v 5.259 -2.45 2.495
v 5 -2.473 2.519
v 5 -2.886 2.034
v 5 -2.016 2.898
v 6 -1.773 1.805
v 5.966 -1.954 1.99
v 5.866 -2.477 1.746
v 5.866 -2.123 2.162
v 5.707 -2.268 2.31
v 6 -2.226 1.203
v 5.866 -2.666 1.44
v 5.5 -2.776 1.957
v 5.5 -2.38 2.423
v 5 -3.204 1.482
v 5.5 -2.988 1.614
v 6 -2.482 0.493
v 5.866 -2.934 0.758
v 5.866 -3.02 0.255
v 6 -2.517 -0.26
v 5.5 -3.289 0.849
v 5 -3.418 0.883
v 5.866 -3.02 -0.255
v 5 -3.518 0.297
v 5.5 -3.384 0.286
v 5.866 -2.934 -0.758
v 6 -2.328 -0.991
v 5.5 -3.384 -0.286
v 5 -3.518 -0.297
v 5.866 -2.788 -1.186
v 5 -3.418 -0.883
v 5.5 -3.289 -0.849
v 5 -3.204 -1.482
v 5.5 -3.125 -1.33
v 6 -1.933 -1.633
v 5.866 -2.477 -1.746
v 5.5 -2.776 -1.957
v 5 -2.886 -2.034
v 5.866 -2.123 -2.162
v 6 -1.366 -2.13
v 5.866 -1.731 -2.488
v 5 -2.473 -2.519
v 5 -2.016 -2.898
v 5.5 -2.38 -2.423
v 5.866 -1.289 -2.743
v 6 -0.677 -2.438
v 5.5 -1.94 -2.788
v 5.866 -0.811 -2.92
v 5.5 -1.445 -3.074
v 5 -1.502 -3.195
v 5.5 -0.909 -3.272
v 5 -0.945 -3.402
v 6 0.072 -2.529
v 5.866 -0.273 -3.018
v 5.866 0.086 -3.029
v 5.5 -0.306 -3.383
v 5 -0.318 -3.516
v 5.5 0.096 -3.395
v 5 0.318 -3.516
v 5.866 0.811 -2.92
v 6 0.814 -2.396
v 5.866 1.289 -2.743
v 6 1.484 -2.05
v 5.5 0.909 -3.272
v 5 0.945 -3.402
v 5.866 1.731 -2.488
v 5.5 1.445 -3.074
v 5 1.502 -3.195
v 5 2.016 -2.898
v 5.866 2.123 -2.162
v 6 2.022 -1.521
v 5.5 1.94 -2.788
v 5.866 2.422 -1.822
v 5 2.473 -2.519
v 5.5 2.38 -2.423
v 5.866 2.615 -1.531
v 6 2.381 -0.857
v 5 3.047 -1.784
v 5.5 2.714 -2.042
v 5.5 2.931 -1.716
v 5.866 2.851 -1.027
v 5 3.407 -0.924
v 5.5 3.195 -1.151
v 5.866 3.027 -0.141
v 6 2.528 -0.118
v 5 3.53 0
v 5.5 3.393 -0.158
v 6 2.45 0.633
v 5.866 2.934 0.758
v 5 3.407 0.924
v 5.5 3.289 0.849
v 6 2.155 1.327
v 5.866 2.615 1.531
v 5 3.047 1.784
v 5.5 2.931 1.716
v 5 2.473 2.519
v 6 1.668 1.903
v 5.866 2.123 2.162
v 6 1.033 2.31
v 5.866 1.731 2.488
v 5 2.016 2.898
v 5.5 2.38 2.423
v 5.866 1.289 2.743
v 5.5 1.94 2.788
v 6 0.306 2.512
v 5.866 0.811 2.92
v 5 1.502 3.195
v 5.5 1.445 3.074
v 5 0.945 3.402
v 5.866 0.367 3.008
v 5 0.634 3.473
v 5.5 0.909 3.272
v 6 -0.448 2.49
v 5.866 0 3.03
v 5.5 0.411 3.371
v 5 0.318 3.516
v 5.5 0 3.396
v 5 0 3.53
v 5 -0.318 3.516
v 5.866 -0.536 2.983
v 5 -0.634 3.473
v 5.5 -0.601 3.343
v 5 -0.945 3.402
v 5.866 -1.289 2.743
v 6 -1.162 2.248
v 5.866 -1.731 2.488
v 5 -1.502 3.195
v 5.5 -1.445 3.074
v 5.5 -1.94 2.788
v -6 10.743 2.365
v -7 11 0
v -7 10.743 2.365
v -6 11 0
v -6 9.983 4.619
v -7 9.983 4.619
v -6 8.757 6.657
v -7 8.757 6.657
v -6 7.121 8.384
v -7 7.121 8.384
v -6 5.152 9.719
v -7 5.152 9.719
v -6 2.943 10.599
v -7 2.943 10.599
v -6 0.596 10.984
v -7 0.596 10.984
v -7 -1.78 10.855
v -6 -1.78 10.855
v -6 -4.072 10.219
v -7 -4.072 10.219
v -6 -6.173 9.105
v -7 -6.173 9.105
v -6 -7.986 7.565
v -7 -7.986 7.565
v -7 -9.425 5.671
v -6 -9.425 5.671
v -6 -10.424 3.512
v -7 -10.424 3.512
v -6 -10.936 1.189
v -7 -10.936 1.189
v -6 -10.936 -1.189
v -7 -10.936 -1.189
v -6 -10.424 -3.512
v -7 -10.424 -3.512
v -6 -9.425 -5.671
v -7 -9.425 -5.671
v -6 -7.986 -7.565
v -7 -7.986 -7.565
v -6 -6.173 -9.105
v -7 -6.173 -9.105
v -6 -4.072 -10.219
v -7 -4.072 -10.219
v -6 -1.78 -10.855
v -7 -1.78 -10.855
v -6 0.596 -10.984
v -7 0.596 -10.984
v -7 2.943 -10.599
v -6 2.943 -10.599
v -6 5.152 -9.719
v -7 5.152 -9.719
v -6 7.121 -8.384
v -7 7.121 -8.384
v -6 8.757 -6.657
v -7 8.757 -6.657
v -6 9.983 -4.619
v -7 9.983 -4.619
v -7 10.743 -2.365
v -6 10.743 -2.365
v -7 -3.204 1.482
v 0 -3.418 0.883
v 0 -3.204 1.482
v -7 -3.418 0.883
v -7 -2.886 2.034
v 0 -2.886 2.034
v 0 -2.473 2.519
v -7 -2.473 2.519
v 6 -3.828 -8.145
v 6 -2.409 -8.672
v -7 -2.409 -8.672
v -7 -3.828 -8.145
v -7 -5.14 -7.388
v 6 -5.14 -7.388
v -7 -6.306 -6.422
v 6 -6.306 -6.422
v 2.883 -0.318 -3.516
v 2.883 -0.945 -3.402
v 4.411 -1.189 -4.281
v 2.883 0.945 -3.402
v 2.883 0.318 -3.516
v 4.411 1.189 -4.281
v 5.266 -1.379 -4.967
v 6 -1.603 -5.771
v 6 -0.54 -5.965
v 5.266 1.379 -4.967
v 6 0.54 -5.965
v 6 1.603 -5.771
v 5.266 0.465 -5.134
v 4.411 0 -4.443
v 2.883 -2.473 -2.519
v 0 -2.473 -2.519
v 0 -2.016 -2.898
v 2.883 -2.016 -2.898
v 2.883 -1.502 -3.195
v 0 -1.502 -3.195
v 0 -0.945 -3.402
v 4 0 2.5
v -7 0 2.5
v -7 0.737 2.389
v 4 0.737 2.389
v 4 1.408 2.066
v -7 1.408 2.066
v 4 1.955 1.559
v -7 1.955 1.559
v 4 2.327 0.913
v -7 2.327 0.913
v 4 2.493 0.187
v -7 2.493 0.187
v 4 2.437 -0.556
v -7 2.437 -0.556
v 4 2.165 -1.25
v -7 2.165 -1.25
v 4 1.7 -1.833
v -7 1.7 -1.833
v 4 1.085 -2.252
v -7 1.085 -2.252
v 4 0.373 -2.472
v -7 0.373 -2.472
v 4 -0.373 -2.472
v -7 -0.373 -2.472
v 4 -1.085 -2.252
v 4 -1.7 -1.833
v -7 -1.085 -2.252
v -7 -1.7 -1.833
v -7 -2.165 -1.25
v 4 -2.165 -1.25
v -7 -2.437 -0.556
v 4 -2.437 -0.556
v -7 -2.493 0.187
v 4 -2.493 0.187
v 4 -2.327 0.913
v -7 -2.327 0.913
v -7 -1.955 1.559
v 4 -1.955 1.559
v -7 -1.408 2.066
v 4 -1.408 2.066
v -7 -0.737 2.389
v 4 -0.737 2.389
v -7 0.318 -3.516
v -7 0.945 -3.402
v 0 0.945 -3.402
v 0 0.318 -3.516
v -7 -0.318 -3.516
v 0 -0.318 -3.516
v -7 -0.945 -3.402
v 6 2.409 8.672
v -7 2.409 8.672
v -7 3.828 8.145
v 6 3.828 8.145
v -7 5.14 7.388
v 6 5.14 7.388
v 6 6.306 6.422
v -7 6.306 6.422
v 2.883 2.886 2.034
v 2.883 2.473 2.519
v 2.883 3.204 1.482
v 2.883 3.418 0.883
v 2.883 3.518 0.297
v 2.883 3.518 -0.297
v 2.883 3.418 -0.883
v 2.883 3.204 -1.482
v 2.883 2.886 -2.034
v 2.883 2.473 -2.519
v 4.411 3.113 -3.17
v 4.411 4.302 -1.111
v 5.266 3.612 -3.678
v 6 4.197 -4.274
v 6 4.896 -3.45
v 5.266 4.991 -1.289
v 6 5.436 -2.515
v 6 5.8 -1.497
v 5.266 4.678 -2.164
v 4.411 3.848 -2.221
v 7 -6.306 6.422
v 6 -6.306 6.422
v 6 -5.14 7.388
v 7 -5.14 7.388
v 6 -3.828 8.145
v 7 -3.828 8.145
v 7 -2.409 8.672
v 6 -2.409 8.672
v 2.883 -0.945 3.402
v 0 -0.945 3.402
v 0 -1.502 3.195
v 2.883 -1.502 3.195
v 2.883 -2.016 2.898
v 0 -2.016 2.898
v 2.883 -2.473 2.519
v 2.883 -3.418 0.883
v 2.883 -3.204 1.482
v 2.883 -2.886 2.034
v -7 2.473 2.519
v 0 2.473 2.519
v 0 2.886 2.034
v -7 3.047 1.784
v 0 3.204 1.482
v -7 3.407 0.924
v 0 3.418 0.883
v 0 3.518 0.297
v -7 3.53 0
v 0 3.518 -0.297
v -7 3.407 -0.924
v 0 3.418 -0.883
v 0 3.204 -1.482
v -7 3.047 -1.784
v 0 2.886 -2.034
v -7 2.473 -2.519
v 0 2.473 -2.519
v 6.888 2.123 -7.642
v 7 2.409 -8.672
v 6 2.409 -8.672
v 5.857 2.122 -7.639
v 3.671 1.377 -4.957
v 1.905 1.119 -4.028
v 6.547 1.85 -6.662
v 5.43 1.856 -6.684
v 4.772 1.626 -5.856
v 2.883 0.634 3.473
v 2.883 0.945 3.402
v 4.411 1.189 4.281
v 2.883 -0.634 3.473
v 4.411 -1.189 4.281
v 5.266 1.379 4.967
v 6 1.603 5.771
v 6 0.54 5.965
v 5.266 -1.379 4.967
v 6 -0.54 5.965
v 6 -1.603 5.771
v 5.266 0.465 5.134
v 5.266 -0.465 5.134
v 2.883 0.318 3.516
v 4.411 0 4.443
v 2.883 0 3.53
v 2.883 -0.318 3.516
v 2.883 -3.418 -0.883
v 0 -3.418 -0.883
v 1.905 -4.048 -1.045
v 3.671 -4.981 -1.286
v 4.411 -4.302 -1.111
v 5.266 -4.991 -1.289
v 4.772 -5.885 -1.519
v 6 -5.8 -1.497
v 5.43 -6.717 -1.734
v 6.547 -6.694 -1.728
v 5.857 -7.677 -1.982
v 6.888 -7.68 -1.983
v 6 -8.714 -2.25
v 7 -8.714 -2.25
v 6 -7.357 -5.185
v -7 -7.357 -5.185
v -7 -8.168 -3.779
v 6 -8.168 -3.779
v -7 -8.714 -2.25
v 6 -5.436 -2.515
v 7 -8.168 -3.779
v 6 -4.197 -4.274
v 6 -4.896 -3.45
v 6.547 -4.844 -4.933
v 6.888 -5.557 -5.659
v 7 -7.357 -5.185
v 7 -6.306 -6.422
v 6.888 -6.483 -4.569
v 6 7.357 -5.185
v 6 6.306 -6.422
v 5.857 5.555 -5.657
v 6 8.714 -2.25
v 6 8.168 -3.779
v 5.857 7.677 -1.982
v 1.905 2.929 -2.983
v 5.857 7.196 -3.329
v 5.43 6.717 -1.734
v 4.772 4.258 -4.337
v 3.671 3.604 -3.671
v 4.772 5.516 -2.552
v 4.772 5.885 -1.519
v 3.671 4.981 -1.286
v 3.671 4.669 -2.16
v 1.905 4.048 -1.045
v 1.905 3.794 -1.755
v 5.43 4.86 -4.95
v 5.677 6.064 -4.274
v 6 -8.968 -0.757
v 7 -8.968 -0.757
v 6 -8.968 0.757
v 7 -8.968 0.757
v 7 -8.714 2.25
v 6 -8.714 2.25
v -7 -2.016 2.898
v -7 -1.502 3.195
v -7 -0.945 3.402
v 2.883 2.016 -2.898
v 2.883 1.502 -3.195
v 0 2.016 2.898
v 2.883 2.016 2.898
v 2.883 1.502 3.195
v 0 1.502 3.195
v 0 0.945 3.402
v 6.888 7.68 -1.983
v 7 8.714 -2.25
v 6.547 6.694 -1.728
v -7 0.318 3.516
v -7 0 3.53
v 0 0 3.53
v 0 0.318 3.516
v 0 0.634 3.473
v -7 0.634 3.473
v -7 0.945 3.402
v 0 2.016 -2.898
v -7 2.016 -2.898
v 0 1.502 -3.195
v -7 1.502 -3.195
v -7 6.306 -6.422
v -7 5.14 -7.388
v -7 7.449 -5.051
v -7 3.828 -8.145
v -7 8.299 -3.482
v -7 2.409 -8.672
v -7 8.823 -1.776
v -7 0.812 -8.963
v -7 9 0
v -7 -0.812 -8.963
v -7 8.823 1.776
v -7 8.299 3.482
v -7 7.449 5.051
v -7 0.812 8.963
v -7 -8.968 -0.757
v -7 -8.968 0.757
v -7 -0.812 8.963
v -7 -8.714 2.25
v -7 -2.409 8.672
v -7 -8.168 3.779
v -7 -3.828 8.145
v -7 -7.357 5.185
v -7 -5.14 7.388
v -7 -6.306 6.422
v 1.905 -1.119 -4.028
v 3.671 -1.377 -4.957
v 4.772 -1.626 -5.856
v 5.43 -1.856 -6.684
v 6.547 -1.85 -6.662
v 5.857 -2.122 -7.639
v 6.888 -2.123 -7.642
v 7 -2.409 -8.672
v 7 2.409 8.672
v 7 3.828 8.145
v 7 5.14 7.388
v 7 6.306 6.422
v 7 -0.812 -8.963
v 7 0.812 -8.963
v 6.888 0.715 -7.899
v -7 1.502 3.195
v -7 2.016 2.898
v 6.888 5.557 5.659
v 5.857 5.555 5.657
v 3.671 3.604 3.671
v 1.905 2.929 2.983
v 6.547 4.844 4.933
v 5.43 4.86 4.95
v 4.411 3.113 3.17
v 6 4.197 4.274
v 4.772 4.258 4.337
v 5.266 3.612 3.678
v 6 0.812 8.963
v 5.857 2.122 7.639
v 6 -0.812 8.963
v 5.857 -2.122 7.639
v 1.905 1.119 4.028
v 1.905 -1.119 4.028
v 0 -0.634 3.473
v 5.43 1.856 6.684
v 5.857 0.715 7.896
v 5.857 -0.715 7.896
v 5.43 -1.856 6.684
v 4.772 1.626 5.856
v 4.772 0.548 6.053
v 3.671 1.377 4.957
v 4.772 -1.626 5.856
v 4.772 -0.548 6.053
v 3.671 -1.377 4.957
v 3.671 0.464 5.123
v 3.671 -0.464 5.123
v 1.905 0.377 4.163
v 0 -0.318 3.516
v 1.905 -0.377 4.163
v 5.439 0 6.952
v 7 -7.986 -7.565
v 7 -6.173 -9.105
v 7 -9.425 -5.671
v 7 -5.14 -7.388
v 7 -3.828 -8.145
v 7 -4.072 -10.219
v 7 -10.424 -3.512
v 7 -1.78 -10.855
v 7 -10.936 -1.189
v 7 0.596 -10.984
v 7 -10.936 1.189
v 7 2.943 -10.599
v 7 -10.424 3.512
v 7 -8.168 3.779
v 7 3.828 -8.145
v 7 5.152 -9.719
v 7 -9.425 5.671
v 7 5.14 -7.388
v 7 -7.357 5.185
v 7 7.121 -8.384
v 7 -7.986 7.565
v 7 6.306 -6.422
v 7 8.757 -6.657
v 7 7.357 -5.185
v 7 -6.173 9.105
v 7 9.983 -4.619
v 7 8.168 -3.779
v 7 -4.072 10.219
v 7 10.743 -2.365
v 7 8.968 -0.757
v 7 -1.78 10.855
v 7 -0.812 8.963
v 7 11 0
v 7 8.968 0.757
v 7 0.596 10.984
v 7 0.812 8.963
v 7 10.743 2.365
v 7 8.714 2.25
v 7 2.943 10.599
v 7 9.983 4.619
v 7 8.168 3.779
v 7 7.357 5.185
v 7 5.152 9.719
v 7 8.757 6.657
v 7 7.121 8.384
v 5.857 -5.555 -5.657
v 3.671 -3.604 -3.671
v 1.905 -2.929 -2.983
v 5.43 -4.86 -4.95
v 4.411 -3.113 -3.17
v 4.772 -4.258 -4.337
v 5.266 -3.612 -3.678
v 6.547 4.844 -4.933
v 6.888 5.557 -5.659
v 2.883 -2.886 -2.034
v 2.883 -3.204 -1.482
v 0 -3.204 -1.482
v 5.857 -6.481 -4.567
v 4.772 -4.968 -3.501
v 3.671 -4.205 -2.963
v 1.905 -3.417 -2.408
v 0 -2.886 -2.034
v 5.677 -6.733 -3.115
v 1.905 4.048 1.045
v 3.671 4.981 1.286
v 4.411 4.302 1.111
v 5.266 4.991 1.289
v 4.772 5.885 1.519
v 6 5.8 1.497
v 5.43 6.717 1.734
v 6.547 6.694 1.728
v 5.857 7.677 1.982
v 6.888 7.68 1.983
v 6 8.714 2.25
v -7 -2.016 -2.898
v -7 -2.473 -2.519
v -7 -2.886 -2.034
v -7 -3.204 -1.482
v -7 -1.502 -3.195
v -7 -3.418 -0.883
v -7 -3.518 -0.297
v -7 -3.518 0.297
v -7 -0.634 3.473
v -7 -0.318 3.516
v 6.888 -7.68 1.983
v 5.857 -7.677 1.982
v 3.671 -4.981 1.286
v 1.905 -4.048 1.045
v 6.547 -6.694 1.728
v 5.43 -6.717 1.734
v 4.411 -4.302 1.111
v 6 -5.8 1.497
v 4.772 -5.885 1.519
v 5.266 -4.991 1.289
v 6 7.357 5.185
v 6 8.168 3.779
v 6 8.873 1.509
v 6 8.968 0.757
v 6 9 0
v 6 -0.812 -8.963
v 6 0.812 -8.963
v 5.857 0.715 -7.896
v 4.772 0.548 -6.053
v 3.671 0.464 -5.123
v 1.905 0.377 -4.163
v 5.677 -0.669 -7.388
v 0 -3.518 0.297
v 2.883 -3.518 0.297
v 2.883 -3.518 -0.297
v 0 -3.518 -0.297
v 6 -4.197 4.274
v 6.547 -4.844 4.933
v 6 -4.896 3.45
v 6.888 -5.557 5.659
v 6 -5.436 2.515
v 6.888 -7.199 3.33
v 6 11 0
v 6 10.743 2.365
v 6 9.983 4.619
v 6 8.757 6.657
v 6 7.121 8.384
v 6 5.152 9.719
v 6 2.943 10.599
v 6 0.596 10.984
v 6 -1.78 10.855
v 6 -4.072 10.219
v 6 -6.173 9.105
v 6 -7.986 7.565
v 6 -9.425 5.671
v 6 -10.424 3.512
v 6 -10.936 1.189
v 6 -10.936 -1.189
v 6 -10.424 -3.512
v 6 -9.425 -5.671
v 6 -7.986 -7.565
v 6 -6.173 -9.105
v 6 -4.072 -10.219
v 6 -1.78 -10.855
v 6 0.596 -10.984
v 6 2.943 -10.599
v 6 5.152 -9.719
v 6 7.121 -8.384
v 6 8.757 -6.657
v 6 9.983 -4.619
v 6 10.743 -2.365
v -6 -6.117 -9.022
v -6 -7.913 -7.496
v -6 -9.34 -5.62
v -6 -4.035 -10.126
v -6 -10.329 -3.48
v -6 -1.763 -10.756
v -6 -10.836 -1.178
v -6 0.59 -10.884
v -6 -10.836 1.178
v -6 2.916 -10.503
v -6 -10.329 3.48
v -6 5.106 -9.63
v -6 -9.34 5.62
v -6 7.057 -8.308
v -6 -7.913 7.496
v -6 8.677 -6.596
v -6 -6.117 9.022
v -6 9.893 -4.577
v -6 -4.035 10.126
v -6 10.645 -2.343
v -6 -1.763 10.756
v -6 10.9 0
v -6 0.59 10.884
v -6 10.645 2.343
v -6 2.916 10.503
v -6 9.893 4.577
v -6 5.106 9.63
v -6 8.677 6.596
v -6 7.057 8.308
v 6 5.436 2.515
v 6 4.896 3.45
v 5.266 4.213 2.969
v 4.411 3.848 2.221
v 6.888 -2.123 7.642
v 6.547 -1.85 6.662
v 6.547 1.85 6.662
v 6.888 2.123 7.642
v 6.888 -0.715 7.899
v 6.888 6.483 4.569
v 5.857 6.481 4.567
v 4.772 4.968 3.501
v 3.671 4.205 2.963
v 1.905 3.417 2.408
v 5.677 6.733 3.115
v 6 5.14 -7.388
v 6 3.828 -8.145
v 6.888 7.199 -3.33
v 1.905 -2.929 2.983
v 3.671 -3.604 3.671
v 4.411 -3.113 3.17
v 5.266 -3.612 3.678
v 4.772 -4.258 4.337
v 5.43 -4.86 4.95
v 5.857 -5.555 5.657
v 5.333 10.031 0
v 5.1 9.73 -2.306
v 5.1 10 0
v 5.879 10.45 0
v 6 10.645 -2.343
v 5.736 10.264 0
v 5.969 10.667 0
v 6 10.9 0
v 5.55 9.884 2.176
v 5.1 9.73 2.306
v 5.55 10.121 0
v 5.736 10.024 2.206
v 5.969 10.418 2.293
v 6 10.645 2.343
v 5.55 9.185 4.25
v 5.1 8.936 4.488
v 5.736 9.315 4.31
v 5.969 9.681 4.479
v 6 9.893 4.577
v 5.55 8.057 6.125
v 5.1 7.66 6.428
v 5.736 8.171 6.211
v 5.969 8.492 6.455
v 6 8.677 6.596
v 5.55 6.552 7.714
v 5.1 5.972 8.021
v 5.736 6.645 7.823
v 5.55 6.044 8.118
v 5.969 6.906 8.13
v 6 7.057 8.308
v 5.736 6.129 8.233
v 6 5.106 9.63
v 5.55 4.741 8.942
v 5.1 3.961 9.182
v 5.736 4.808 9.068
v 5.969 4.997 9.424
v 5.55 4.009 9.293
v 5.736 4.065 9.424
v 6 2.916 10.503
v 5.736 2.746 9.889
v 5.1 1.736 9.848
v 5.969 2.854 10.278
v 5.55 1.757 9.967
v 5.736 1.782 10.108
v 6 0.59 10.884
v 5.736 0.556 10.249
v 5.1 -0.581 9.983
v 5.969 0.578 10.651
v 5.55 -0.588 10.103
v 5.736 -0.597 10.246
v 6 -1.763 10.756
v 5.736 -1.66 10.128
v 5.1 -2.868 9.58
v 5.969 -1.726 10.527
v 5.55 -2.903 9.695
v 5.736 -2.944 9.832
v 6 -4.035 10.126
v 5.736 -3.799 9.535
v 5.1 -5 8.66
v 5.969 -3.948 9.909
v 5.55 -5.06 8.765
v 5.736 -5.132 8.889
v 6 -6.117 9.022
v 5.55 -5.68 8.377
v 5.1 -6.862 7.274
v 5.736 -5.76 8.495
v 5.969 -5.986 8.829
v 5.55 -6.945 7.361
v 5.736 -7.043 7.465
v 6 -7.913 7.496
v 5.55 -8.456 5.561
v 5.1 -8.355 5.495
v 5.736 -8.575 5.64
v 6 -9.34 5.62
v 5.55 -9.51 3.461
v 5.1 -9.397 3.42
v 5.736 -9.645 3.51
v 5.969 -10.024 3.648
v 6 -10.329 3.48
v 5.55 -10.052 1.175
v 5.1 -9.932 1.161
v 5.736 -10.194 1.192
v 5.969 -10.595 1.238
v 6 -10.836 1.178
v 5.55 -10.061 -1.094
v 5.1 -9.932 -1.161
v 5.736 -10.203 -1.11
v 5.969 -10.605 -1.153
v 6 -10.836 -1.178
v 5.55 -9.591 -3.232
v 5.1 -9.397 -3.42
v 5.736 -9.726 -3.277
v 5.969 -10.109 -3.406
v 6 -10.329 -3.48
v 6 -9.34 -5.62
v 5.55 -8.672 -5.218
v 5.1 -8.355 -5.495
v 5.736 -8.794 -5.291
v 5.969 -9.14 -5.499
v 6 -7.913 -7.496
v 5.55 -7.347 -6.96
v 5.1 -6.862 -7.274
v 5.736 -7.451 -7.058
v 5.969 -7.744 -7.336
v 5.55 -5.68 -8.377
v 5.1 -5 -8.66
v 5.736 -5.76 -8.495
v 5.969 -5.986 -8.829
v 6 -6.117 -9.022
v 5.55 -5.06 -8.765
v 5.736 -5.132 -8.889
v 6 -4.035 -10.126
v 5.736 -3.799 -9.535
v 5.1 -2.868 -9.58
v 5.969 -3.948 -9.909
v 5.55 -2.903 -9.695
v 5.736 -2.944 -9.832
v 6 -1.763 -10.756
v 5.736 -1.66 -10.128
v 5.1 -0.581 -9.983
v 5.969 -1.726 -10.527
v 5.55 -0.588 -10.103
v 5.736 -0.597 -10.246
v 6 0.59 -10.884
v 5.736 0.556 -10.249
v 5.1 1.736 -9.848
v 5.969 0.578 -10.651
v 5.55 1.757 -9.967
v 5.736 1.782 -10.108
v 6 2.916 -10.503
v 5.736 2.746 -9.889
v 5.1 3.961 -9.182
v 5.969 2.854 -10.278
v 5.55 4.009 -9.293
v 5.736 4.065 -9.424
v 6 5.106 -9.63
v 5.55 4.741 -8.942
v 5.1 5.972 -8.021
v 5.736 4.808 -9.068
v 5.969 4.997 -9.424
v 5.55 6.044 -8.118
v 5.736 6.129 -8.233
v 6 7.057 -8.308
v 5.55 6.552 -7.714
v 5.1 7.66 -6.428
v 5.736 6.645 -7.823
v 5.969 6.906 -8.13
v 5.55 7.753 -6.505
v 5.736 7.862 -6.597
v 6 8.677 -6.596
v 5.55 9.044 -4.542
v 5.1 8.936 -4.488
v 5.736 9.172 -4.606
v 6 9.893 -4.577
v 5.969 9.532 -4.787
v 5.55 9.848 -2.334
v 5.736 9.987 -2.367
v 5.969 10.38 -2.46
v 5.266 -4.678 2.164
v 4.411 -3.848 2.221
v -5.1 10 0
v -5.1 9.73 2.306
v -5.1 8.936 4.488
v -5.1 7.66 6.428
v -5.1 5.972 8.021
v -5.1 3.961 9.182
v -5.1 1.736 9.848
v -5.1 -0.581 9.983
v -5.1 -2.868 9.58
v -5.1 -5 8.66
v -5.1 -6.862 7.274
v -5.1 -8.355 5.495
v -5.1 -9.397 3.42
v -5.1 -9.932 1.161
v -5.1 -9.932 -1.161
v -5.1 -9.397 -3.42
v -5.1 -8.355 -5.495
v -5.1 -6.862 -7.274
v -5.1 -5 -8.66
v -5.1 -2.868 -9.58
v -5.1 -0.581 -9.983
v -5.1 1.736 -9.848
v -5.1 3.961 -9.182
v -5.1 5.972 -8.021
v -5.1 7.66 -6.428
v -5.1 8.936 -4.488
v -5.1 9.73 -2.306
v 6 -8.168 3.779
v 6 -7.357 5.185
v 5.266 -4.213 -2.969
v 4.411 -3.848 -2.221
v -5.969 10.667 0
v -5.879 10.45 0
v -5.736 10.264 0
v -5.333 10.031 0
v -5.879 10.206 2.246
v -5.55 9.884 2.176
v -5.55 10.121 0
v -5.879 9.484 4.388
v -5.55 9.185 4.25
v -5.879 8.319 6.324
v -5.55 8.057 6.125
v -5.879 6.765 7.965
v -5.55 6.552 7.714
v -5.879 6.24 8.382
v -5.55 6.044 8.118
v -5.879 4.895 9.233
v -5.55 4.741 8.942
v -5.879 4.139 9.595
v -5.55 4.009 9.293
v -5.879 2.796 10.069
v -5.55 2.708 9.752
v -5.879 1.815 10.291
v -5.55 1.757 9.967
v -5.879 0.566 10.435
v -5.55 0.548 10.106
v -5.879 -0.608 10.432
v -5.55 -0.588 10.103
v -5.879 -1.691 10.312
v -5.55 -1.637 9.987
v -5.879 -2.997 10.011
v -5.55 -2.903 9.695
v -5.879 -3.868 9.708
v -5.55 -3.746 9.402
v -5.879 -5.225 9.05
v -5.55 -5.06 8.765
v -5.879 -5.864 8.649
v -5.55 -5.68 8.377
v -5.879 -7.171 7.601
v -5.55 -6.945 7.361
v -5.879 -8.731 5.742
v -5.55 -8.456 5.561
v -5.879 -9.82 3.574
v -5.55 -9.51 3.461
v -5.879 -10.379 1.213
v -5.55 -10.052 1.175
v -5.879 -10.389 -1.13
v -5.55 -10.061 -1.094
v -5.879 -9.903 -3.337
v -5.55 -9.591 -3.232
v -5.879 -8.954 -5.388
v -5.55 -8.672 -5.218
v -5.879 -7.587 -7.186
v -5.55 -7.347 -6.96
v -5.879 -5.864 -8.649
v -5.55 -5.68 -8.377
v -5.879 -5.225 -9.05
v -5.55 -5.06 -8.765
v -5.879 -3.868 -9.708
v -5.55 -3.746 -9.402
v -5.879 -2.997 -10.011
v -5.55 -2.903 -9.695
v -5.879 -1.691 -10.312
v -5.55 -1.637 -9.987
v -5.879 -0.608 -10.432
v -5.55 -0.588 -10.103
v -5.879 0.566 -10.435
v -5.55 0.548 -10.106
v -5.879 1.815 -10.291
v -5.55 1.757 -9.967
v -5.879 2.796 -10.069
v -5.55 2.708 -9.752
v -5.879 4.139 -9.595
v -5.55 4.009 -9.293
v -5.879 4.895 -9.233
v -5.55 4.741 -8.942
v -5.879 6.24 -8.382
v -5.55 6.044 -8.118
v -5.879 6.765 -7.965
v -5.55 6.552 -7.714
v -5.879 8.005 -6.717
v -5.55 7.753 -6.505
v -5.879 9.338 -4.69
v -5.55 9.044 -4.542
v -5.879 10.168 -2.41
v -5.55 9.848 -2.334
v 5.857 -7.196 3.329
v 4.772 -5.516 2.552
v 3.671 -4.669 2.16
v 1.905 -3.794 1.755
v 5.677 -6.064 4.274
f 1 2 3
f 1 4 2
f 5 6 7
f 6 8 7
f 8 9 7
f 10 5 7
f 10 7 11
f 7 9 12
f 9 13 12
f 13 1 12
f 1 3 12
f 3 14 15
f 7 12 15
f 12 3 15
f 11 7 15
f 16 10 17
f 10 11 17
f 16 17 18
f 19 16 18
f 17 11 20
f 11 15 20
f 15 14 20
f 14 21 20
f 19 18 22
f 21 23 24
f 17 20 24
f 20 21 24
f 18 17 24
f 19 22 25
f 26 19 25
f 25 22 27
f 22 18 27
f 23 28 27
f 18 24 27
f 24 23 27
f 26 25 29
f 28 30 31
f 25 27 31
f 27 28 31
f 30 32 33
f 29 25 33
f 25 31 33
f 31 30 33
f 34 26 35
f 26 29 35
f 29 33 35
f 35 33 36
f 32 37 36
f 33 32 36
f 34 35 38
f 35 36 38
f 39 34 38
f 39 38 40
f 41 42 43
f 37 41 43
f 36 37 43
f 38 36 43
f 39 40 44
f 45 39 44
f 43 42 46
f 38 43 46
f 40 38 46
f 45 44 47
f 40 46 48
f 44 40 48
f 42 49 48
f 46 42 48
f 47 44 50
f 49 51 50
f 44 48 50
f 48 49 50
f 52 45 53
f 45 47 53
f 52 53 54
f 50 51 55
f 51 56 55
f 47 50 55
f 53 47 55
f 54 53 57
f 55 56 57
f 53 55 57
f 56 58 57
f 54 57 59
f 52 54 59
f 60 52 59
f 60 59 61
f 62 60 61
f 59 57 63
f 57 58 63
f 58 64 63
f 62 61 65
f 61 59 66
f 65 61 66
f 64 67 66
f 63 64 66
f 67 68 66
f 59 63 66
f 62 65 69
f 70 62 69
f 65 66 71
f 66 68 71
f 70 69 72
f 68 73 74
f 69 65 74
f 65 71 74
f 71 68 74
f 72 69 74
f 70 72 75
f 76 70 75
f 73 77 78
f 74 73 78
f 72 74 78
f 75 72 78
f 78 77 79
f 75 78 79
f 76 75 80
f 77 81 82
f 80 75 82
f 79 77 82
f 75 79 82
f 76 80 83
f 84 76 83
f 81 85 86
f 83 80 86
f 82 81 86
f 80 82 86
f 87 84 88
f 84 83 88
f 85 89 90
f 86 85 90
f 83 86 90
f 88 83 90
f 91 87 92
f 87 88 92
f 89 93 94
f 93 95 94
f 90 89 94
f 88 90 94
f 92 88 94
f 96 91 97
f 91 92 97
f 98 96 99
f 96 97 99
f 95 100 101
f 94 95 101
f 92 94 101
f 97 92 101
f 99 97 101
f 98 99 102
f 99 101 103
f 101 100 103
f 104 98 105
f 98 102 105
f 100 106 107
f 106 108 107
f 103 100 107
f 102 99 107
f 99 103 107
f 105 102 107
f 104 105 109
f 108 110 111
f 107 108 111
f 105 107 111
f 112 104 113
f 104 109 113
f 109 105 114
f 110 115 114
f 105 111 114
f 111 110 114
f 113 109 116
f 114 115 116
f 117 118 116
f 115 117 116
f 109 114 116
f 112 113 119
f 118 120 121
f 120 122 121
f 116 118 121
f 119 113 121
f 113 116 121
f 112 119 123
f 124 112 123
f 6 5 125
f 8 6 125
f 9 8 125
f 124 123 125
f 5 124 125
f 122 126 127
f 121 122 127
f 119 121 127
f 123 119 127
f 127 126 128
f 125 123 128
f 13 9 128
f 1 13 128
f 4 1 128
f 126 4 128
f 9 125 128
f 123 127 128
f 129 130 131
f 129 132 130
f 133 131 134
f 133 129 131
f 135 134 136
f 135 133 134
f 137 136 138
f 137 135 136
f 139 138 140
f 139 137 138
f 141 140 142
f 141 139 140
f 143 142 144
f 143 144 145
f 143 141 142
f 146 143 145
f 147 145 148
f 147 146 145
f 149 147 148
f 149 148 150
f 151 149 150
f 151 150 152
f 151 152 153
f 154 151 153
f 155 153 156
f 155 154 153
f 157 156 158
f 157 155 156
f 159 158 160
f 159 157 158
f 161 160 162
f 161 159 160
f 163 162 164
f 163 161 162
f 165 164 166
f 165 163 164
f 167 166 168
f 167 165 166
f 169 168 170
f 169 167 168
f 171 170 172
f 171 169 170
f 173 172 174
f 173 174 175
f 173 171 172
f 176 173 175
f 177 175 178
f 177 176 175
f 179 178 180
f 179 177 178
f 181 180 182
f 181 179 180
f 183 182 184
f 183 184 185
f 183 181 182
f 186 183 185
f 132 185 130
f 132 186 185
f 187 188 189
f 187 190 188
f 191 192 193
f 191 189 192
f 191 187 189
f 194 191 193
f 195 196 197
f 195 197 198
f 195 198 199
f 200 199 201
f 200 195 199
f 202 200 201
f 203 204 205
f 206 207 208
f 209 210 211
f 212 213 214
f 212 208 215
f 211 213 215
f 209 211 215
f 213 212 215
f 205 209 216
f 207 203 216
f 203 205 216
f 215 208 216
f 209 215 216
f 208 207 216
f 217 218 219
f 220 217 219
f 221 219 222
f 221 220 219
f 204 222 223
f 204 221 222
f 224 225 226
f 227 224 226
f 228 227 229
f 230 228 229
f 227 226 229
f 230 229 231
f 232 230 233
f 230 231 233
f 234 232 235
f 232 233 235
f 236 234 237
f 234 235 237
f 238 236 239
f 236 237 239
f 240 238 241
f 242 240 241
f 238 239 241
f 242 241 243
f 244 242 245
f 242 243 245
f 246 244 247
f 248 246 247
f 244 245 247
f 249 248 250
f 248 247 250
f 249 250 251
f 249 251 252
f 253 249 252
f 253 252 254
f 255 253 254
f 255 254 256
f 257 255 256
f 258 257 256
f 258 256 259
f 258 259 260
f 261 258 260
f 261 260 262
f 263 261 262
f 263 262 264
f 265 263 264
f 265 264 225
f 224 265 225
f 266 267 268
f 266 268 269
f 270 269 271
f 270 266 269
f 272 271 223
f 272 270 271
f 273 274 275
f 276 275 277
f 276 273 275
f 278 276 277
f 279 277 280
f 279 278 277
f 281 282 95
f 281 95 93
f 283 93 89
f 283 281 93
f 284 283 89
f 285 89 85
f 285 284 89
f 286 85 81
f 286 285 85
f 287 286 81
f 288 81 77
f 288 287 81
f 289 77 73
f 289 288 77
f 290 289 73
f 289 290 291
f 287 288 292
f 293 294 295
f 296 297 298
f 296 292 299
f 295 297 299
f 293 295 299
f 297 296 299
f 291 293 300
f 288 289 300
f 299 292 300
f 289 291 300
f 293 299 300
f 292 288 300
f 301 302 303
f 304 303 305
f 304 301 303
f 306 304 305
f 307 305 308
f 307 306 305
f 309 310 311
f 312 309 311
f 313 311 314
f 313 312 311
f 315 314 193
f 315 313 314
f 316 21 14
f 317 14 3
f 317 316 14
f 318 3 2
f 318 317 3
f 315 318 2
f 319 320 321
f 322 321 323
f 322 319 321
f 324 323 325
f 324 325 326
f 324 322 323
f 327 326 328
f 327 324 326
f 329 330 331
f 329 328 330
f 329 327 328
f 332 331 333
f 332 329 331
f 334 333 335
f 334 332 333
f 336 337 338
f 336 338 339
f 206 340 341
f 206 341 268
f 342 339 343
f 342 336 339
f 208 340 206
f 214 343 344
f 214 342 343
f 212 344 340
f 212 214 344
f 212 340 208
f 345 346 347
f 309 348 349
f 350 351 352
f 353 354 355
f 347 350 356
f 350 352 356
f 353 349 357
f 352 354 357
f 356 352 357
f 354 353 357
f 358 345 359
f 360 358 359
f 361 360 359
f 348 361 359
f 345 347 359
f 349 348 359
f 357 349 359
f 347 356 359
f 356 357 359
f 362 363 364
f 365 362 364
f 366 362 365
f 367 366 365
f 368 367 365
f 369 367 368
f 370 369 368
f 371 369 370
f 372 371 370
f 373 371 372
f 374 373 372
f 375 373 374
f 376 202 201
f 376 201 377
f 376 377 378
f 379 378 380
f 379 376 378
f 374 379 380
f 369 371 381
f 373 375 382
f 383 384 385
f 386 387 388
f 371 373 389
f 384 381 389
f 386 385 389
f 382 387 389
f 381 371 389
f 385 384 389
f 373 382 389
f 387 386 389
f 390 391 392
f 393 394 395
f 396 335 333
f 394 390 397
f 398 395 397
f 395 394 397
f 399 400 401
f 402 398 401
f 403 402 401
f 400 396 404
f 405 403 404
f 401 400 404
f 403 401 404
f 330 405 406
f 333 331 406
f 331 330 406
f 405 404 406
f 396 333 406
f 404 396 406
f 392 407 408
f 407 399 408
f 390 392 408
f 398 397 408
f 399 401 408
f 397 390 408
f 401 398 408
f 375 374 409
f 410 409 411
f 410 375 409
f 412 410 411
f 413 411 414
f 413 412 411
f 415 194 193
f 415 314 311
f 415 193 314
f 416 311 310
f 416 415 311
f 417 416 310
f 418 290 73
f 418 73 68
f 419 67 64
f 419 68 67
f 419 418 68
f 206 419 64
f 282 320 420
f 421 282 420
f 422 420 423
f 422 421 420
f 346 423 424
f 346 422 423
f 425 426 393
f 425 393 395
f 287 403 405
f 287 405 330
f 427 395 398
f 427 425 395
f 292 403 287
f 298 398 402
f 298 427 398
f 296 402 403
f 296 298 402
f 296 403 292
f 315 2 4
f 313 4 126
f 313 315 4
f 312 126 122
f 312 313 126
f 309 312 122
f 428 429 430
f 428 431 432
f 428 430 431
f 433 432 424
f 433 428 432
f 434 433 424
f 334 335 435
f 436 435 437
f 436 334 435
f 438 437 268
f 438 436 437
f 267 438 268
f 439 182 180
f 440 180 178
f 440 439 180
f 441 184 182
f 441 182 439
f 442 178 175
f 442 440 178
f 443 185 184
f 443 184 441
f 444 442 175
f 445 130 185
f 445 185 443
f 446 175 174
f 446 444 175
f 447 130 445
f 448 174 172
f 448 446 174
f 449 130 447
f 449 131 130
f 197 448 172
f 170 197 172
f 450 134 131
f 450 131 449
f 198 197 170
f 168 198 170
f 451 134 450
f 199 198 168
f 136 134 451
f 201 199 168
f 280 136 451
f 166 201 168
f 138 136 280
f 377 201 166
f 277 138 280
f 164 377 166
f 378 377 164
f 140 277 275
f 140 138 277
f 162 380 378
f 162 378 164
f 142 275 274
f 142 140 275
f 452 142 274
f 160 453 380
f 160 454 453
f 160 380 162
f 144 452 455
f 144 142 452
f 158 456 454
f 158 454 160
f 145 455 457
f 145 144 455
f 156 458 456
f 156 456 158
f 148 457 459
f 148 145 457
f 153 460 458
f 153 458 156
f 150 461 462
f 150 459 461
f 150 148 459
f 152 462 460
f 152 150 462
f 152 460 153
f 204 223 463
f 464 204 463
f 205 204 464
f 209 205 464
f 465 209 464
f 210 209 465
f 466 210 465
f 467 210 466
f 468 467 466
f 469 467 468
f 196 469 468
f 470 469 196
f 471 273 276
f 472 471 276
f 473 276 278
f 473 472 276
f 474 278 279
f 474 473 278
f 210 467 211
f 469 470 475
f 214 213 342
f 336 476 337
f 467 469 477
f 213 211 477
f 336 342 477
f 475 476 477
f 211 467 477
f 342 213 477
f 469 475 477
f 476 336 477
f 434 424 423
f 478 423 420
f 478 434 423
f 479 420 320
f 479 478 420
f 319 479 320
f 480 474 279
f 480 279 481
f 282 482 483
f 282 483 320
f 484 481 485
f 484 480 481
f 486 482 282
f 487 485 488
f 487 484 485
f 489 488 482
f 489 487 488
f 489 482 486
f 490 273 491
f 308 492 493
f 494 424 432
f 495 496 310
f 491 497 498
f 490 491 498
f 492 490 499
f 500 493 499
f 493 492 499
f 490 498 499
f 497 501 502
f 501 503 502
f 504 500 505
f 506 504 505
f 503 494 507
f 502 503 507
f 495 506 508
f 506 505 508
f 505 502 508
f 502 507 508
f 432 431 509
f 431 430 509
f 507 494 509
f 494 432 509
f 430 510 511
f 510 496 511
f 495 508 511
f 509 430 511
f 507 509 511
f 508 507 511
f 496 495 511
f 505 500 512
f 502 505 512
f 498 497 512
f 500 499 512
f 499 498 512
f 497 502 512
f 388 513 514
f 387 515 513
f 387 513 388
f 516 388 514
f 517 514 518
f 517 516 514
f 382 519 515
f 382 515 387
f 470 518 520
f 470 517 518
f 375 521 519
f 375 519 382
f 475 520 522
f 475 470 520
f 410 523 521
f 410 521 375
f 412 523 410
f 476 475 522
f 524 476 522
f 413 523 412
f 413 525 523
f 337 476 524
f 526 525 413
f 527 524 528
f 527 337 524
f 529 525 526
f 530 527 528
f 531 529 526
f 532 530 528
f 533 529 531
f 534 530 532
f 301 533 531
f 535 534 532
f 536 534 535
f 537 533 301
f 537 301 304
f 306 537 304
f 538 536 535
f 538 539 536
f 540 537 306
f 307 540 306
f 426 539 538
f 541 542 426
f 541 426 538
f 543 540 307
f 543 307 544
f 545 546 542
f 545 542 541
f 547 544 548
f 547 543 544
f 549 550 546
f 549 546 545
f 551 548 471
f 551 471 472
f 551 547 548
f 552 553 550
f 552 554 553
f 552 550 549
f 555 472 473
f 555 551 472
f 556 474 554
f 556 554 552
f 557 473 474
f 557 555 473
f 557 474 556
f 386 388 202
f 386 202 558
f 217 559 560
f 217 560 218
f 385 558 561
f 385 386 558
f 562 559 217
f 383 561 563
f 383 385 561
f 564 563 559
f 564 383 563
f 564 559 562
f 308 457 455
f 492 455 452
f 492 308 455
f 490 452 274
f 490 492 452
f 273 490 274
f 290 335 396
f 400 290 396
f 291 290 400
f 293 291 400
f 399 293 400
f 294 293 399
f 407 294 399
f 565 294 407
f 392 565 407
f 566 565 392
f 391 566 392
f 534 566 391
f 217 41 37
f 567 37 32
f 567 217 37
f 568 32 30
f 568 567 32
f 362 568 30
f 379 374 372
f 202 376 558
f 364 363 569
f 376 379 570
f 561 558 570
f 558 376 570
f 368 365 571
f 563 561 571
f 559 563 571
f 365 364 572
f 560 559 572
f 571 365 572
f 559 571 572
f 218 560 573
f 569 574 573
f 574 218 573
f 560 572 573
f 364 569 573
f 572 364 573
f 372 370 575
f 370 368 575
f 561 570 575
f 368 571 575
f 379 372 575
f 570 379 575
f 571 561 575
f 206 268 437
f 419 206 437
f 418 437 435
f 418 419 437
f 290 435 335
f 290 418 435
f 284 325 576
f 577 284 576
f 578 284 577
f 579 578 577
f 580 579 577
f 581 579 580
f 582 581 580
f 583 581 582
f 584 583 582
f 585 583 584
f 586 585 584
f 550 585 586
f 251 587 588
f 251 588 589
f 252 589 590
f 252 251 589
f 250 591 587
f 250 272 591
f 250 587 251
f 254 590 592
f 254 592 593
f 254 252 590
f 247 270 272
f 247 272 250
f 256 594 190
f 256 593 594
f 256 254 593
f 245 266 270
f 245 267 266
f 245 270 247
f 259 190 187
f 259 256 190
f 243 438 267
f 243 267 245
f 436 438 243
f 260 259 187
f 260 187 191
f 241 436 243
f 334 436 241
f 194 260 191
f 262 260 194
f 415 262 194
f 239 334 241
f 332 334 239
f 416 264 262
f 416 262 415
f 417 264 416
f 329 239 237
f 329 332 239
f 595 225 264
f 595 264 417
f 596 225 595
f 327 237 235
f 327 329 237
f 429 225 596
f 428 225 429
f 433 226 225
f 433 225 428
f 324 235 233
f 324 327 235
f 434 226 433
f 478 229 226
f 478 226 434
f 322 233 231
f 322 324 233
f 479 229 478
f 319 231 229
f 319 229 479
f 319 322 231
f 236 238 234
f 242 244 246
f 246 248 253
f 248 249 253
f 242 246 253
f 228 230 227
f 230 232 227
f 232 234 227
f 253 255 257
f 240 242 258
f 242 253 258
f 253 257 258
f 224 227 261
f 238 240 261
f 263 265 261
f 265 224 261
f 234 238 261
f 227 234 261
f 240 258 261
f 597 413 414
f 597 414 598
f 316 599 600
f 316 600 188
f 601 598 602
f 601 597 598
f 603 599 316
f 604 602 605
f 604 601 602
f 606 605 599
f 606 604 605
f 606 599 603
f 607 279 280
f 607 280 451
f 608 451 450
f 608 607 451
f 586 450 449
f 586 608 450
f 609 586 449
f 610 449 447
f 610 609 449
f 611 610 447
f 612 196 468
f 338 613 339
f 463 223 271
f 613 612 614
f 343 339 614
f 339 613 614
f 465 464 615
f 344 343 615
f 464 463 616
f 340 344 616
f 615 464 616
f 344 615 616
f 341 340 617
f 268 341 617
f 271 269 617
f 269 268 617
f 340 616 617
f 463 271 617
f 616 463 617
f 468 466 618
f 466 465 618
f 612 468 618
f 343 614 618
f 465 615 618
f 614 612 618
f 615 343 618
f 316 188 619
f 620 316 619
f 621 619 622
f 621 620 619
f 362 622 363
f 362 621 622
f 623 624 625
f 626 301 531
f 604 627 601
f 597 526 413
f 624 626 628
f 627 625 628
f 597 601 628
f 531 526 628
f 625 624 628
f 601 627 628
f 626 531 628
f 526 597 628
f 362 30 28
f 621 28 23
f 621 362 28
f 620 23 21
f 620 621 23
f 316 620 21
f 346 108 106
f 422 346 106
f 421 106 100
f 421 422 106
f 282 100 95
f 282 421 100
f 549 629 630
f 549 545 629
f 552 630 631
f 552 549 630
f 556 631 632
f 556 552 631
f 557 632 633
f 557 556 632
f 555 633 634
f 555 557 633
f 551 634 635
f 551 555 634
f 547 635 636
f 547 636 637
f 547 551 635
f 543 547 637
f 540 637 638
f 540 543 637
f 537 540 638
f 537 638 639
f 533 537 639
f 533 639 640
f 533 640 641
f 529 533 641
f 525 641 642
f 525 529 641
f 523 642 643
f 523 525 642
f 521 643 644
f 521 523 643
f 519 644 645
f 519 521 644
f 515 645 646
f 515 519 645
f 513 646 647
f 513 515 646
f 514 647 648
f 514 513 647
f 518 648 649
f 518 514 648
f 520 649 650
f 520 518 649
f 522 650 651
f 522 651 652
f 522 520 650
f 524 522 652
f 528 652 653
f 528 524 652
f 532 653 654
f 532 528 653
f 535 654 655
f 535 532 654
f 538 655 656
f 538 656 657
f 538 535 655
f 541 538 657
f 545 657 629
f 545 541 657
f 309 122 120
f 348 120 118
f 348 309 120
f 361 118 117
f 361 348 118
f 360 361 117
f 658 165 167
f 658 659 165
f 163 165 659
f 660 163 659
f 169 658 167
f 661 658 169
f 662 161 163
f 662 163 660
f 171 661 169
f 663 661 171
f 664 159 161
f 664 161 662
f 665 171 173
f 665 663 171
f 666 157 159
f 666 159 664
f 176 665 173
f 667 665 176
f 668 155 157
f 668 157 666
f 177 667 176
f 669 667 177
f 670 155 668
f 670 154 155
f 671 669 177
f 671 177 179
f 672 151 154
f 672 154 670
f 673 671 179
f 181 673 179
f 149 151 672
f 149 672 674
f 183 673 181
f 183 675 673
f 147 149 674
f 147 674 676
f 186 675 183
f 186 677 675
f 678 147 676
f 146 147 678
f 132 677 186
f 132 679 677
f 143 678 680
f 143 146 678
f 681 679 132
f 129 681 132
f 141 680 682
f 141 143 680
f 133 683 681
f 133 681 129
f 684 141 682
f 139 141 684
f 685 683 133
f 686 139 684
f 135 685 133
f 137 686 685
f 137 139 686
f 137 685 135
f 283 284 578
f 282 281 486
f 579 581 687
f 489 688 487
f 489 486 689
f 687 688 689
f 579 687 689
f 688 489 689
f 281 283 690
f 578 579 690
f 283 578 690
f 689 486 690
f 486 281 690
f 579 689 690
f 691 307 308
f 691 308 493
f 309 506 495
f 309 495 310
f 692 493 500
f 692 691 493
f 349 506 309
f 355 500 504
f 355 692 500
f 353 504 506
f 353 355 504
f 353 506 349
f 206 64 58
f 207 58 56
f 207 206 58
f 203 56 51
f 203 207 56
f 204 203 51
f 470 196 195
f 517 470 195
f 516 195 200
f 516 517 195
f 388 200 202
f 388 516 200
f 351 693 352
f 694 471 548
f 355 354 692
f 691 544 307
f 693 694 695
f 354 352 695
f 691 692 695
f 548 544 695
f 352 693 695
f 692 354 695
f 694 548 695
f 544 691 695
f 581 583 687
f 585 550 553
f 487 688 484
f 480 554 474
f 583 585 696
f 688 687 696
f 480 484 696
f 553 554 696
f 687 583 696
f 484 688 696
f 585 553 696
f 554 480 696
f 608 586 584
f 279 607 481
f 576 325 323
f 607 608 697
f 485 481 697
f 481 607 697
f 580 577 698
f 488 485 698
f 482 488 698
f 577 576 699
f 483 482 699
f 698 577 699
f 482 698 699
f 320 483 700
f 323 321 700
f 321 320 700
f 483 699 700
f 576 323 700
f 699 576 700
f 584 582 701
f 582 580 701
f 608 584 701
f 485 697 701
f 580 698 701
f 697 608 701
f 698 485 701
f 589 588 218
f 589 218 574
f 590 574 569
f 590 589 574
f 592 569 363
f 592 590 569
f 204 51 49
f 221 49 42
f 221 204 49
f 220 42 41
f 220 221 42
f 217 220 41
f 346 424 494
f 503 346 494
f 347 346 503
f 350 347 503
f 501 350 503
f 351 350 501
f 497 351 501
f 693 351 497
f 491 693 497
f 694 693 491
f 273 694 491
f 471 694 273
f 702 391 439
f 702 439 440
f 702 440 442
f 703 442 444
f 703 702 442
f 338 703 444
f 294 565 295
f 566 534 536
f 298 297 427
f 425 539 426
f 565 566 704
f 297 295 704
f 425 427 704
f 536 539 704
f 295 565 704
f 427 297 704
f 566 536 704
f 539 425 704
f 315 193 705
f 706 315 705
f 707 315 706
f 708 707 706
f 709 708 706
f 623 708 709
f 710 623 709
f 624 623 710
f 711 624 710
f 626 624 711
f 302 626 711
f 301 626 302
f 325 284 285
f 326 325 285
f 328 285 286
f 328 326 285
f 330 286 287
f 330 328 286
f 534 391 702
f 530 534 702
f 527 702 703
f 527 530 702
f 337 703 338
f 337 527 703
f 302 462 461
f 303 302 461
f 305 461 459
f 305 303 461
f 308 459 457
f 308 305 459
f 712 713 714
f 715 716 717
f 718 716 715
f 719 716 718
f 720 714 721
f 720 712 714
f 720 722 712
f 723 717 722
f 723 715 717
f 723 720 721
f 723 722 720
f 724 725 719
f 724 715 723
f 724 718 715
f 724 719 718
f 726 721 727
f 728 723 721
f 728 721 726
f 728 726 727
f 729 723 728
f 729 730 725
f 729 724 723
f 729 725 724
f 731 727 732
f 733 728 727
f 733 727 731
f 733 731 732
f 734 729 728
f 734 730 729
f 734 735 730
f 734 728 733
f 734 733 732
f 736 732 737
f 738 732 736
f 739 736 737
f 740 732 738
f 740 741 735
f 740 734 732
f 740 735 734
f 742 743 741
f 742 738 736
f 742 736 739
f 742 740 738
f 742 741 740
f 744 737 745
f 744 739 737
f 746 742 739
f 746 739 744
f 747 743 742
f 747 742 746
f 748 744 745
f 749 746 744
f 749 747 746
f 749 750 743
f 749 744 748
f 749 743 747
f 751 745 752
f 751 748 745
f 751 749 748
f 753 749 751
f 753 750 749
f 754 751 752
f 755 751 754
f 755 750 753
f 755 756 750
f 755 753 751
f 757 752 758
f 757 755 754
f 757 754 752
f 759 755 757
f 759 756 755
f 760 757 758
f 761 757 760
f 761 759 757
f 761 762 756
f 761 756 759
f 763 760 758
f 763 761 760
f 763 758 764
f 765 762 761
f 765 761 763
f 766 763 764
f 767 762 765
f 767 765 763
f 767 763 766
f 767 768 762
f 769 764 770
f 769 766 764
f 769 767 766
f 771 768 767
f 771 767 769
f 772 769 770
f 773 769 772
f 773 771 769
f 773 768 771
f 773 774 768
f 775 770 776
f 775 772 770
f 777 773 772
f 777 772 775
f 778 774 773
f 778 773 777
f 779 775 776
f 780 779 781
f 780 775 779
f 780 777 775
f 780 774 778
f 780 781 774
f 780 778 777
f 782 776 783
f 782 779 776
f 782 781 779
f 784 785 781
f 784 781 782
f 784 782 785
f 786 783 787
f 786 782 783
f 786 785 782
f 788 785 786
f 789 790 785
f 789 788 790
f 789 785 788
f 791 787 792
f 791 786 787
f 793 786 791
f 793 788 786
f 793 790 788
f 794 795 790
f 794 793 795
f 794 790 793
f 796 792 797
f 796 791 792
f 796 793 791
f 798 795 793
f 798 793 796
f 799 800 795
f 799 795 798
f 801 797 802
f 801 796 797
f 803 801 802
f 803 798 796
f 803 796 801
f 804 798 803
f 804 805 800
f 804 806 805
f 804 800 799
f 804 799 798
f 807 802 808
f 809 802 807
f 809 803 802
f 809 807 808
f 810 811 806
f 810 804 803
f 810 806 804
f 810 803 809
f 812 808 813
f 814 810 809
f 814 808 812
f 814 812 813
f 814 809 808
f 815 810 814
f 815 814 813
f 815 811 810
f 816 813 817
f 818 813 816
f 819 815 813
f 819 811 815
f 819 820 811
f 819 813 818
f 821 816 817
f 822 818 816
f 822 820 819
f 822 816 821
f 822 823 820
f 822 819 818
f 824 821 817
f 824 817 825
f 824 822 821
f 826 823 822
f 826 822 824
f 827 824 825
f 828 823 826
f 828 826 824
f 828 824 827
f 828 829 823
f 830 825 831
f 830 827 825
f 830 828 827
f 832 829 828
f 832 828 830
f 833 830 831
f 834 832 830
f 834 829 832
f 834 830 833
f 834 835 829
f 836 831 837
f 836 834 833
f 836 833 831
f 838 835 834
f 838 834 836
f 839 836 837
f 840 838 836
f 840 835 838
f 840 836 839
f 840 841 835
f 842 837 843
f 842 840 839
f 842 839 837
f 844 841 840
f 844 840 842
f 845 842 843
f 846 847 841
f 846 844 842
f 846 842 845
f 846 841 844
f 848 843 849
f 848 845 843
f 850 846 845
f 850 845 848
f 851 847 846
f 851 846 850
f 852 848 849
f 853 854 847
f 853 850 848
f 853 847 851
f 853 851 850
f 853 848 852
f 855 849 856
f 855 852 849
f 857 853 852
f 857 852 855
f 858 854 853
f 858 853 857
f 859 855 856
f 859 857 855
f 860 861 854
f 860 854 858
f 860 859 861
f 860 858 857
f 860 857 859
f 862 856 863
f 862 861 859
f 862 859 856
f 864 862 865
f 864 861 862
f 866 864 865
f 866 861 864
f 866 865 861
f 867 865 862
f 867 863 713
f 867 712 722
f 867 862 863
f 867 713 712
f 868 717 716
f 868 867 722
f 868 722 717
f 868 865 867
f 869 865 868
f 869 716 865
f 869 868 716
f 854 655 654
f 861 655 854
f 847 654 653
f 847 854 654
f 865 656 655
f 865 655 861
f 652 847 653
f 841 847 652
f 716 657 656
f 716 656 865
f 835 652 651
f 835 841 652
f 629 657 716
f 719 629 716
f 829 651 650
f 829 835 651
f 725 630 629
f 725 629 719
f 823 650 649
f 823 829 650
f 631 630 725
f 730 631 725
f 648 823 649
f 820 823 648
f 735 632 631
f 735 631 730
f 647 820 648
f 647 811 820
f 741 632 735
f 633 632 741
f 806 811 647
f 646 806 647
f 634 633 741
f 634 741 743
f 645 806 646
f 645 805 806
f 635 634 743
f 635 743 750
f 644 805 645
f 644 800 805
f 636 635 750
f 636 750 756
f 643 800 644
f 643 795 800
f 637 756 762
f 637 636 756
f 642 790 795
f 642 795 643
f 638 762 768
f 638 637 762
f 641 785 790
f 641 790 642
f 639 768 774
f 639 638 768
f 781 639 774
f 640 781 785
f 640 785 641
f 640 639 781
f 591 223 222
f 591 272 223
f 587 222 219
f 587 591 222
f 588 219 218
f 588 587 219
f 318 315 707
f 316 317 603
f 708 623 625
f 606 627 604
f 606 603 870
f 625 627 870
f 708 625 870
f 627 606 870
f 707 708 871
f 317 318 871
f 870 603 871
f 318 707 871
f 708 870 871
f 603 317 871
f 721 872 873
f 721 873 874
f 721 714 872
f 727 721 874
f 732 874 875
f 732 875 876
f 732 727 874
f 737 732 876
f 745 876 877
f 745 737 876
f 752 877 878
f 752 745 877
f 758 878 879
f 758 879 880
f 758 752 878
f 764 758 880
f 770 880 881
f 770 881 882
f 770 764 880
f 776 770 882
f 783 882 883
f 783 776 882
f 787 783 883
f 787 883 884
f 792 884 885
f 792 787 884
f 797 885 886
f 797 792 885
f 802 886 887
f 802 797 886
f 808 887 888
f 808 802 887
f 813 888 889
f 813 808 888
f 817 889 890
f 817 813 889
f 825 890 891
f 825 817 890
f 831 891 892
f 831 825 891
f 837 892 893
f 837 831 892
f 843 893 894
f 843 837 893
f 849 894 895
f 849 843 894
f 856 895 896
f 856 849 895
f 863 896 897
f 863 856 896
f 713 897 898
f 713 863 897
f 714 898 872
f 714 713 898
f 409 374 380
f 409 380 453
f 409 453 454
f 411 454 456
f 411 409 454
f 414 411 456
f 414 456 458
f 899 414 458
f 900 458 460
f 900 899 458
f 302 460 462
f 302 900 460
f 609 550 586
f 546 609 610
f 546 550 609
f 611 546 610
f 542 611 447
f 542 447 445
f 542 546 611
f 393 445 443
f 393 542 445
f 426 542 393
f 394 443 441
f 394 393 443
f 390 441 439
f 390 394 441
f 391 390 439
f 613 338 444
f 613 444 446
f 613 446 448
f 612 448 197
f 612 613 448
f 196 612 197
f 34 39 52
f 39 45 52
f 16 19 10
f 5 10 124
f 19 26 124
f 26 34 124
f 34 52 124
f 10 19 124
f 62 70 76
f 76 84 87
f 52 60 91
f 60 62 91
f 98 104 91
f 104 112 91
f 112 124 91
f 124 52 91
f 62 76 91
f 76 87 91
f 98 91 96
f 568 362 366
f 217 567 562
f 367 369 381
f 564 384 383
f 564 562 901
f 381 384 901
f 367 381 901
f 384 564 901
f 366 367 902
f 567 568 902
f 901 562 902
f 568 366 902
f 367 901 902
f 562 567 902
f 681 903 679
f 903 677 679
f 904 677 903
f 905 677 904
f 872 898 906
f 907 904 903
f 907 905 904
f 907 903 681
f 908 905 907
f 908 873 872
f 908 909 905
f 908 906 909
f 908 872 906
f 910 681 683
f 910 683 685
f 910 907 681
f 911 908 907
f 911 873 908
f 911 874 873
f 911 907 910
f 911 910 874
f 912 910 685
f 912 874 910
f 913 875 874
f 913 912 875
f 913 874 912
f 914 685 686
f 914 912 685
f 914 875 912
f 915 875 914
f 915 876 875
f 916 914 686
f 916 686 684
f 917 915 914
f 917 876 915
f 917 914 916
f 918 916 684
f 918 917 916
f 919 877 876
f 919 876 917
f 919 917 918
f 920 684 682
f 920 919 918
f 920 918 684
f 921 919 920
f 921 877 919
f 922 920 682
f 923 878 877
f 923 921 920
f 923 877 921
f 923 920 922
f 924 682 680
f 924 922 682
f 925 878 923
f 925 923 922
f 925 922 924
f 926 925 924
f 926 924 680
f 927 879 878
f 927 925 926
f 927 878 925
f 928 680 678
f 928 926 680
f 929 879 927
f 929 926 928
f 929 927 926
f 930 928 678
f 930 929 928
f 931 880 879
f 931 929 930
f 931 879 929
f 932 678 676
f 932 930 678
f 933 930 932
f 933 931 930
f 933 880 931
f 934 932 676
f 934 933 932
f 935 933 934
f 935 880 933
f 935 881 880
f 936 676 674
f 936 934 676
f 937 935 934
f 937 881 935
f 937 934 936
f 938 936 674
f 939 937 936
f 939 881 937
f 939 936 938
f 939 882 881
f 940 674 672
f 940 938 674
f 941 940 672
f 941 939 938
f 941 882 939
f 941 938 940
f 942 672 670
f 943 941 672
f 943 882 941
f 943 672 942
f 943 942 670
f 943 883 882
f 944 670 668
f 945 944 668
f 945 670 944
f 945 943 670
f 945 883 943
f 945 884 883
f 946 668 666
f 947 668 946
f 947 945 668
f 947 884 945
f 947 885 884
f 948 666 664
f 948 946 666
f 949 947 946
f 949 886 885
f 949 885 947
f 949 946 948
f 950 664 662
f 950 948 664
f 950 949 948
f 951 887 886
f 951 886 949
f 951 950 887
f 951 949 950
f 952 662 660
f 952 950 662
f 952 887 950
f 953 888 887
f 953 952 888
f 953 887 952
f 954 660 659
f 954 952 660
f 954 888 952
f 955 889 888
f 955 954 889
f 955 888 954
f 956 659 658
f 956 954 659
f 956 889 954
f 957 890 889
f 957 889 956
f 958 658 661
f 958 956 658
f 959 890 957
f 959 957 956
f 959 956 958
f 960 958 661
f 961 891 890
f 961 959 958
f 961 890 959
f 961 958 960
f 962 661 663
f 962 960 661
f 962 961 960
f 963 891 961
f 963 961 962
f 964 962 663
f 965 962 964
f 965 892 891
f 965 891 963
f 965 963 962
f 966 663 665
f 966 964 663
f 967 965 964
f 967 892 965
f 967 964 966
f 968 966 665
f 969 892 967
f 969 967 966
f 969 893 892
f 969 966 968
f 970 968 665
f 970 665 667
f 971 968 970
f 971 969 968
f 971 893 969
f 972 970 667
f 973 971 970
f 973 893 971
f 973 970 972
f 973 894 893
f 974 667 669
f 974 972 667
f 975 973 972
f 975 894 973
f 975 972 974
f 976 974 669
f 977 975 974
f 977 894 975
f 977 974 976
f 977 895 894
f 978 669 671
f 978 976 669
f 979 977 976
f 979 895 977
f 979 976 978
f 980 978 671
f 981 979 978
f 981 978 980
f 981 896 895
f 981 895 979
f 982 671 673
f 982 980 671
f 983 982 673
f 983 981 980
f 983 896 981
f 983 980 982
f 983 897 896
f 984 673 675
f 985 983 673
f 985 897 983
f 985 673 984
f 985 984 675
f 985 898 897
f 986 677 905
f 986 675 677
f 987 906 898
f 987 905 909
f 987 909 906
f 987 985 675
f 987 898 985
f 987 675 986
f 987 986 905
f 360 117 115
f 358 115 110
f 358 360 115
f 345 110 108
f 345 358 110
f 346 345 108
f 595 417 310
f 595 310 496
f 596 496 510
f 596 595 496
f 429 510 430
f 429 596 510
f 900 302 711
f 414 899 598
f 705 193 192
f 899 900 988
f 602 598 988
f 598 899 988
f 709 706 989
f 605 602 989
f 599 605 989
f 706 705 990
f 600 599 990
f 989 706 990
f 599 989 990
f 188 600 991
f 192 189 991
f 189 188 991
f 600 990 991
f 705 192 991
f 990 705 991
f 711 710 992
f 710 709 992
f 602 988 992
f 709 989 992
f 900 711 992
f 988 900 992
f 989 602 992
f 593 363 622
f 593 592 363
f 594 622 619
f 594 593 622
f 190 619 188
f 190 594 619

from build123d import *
from build123d.topology import SkipClean

# Parameters (mm, degrees)
REVOLVE1_OUTLINE_W  = 1
REVOLVE1_OUTLINE_H  = 1
SKETCH2_R           = 3.530343639
SKETCH2_R_2         = 2.5
BOSS_EXTRUDE1_DEPTH = 13
BOSS_EXTRUDE2_START = -2
SKETCH3_R           = 3.530343639
BOSS_EXTRUDE2_DEPTH = 2
CUT_EXTRUDE1_DEPTH  = 21.928449536
CIRPATTERN1_COUNT   = 6
FILLET1_R           = 1


# Read off the part's stored shape, not the designer's step: Revolve1
with BuildPart() as part:
    # Revolve1 outline → Revolve1 (revolve)
    with BuildSketch(Plane.YX):
        with BuildLine():
            add(Edge.make_bspline(
                [(2.5, 0), (2.716234195, 0.906371087), (3.054671918, 1.91746682), (3.530343639, 2.883101851)],
                knots=[0, 0, 0, 0, 0.307599927, 0.307599927, 0.307599927, 0.307599927], degree=3))
            Line((2.5, 0), (3.530343639, 0))
            Line((3.530343639, 0), (3.530343639, 2.883101851))
        make_face()
        with BuildLine():
            add(Edge.make_bspline(
                [(3.530343639, 2.883101851), (4.125497218, 4.091290439), (4.935485854, 5.228311877), (5.989749537, 6)],
                knots=[0.307599927, 0.307599927, 0.307599927, 0.307599927, 0.692464509, 0.692464509, 0.692464509, 0.692464509], degree=3))
            Line((3.530343639, 2.883101851), (3.530343639, 0))
            add(Edge.make_bspline(
                [(9, 6), (8.813858726, 5.999997286), (8.43297149, 5.974351341), (7.749922349, 5.831183314), (6.653568172, 5.361217178), (5.311352408, 4.099132984), (4.3155593, 2.31932682), (3.78420775, 0.901212892), (3.601875729, 0.278067654), (3.530343639, 0)],
                knots=[0, 0, 0, 0, 0.0625, 0.125, 0.25, 0.5, 0.75, 0.875, 0.972909743, 0.972909743, 0.972909743, 0.972909743], degree=3))
            Line((9, 6), (5.989749537, 6))
        make_face()
        with BuildLine():
            add(Edge.make_bspline(
                [(5.989749537, 6), (6.832184813, 6.616636338), (7.830594626, 7), (9, 7)],
                knots=[0.692464509, 0.692464509, 0.692464509, 0.692464509, 1, 1, 1, 1], degree=3))
            Line((5.989749537, 6), (9, 6))
            Line((9, 6), (9, 7))
        make_face()
        Polygon((10, 6), (9, 6), (9, 0), (10, 0), (10, 5.1), align=None)
        with Locations((9.5, 6.5)):
            Rectangle(REVOLVE1_OUTLINE_W, REVOLVE1_OUTLINE_H)
        Polygon((10, 0), (9, 0), (9, -7), (10, -7), (10, -5.1), align=None)
        with BuildLine():
            Line((10.9, 6), (10, 6))
            Line((10, 6), (10, 5.1))
            ThreePointArc((10, 5.1), (10.263603897, 5.736396103), (10.9, 6))
        make_face()
        Polygon((10, 7), (10, 6), (10.9, 6), (11, 6), (11, 7), align=None)
        with BuildLine():
            Line((10, -5.1), (10, -7))
            Line((10, -7), (11, -7))
            Line((11, -7), (11, -6))
            Line((11, -6), (10.9, -6))
            ThreePointArc((10.9, -6), (10.263603897, -5.736396103), (10, -5.1))
        make_face()
    revolve(axis=Axis((0, 0, 0), (1, 0, 0)))

    # Sketch2 → Boss-Extrude1 (add)
    with BuildSketch(Plane.ZY.offset(7)):
        Circle(SKETCH2_R)
        Circle(SKETCH2_R_2, mode=Mode.SUBTRACT)
    extrude(amount=-BOSS_EXTRUDE1_DEPTH)

    # Sketch3 → Boss-Extrude2 (add)
    with BuildSketch(Plane(origin=(6, 0, 0), x_dir=(0, 0, -1), z_dir=(1, 0, 0)).offset(BOSS_EXTRUDE2_START)):
        with Locations(Location((0, 0, 0), (0, 0, 180))):
            Circle(SKETCH3_R)
    extrude(amount=BOSS_EXTRUDE2_DEPTH)

    # Sketch4 → Cut-Extrude1 (cut, through all)
    with SkipClean():  # the faces are left unmerged after this step: merging them gives an invalid solid
        with BuildSketch(Plane(origin=(7, 0, 0), x_dir=(0, 0, -1), z_dir=(1, 0, 0))):
            with BuildLine():
                Line((-0.88258591, 3.41824053), (-2.25, 8.714212529))
                ThreePointArc((-2.25, 8.714212529), (0, 9), (2.25, 8.714212529))
                Line((2.25, 8.714212529), (0.88258591, 3.41824053))
                ThreePointArc((0.88258591, 3.41824053), (0, 3.530343639), (-0.88258591, 3.41824053))
            make_face()
        cut_extrude1 = extrude(amount=-CUT_EXTRUDE1_DEPTH, mode=Mode.SUBTRACT)
    add(part.part.scale(1), mode=Mode.REPLACE)  # the faces are merged on a copy

    # CirPattern1: Cut-Extrude1 ×6 about axis
    with SkipClean():  # the faces are left unmerged after this step: merging them gives an invalid solid
        cirpattern1_axis = Axis((0, 0, 0), (1, 0, 0))
        for i in range(1, CIRPATTERN1_COUNT):
            add(cut_extrude1.rotate(cirpattern1_axis, i * 360 / CIRPATTERN1_COUNT), mode=Mode.SUBTRACT)
    add(part.part.scale(1), mode=Mode.REPLACE)  # the faces are merged on a copy

    # Fillet1
    fillet1_edges = [part.edges().sort_by_distance(p)[0] for p in [
        (6, 3.267738298, 1.336118492),
    ]]
    fillet(fillet1_edges, radius=FILLET1_R)


solid = part.part
